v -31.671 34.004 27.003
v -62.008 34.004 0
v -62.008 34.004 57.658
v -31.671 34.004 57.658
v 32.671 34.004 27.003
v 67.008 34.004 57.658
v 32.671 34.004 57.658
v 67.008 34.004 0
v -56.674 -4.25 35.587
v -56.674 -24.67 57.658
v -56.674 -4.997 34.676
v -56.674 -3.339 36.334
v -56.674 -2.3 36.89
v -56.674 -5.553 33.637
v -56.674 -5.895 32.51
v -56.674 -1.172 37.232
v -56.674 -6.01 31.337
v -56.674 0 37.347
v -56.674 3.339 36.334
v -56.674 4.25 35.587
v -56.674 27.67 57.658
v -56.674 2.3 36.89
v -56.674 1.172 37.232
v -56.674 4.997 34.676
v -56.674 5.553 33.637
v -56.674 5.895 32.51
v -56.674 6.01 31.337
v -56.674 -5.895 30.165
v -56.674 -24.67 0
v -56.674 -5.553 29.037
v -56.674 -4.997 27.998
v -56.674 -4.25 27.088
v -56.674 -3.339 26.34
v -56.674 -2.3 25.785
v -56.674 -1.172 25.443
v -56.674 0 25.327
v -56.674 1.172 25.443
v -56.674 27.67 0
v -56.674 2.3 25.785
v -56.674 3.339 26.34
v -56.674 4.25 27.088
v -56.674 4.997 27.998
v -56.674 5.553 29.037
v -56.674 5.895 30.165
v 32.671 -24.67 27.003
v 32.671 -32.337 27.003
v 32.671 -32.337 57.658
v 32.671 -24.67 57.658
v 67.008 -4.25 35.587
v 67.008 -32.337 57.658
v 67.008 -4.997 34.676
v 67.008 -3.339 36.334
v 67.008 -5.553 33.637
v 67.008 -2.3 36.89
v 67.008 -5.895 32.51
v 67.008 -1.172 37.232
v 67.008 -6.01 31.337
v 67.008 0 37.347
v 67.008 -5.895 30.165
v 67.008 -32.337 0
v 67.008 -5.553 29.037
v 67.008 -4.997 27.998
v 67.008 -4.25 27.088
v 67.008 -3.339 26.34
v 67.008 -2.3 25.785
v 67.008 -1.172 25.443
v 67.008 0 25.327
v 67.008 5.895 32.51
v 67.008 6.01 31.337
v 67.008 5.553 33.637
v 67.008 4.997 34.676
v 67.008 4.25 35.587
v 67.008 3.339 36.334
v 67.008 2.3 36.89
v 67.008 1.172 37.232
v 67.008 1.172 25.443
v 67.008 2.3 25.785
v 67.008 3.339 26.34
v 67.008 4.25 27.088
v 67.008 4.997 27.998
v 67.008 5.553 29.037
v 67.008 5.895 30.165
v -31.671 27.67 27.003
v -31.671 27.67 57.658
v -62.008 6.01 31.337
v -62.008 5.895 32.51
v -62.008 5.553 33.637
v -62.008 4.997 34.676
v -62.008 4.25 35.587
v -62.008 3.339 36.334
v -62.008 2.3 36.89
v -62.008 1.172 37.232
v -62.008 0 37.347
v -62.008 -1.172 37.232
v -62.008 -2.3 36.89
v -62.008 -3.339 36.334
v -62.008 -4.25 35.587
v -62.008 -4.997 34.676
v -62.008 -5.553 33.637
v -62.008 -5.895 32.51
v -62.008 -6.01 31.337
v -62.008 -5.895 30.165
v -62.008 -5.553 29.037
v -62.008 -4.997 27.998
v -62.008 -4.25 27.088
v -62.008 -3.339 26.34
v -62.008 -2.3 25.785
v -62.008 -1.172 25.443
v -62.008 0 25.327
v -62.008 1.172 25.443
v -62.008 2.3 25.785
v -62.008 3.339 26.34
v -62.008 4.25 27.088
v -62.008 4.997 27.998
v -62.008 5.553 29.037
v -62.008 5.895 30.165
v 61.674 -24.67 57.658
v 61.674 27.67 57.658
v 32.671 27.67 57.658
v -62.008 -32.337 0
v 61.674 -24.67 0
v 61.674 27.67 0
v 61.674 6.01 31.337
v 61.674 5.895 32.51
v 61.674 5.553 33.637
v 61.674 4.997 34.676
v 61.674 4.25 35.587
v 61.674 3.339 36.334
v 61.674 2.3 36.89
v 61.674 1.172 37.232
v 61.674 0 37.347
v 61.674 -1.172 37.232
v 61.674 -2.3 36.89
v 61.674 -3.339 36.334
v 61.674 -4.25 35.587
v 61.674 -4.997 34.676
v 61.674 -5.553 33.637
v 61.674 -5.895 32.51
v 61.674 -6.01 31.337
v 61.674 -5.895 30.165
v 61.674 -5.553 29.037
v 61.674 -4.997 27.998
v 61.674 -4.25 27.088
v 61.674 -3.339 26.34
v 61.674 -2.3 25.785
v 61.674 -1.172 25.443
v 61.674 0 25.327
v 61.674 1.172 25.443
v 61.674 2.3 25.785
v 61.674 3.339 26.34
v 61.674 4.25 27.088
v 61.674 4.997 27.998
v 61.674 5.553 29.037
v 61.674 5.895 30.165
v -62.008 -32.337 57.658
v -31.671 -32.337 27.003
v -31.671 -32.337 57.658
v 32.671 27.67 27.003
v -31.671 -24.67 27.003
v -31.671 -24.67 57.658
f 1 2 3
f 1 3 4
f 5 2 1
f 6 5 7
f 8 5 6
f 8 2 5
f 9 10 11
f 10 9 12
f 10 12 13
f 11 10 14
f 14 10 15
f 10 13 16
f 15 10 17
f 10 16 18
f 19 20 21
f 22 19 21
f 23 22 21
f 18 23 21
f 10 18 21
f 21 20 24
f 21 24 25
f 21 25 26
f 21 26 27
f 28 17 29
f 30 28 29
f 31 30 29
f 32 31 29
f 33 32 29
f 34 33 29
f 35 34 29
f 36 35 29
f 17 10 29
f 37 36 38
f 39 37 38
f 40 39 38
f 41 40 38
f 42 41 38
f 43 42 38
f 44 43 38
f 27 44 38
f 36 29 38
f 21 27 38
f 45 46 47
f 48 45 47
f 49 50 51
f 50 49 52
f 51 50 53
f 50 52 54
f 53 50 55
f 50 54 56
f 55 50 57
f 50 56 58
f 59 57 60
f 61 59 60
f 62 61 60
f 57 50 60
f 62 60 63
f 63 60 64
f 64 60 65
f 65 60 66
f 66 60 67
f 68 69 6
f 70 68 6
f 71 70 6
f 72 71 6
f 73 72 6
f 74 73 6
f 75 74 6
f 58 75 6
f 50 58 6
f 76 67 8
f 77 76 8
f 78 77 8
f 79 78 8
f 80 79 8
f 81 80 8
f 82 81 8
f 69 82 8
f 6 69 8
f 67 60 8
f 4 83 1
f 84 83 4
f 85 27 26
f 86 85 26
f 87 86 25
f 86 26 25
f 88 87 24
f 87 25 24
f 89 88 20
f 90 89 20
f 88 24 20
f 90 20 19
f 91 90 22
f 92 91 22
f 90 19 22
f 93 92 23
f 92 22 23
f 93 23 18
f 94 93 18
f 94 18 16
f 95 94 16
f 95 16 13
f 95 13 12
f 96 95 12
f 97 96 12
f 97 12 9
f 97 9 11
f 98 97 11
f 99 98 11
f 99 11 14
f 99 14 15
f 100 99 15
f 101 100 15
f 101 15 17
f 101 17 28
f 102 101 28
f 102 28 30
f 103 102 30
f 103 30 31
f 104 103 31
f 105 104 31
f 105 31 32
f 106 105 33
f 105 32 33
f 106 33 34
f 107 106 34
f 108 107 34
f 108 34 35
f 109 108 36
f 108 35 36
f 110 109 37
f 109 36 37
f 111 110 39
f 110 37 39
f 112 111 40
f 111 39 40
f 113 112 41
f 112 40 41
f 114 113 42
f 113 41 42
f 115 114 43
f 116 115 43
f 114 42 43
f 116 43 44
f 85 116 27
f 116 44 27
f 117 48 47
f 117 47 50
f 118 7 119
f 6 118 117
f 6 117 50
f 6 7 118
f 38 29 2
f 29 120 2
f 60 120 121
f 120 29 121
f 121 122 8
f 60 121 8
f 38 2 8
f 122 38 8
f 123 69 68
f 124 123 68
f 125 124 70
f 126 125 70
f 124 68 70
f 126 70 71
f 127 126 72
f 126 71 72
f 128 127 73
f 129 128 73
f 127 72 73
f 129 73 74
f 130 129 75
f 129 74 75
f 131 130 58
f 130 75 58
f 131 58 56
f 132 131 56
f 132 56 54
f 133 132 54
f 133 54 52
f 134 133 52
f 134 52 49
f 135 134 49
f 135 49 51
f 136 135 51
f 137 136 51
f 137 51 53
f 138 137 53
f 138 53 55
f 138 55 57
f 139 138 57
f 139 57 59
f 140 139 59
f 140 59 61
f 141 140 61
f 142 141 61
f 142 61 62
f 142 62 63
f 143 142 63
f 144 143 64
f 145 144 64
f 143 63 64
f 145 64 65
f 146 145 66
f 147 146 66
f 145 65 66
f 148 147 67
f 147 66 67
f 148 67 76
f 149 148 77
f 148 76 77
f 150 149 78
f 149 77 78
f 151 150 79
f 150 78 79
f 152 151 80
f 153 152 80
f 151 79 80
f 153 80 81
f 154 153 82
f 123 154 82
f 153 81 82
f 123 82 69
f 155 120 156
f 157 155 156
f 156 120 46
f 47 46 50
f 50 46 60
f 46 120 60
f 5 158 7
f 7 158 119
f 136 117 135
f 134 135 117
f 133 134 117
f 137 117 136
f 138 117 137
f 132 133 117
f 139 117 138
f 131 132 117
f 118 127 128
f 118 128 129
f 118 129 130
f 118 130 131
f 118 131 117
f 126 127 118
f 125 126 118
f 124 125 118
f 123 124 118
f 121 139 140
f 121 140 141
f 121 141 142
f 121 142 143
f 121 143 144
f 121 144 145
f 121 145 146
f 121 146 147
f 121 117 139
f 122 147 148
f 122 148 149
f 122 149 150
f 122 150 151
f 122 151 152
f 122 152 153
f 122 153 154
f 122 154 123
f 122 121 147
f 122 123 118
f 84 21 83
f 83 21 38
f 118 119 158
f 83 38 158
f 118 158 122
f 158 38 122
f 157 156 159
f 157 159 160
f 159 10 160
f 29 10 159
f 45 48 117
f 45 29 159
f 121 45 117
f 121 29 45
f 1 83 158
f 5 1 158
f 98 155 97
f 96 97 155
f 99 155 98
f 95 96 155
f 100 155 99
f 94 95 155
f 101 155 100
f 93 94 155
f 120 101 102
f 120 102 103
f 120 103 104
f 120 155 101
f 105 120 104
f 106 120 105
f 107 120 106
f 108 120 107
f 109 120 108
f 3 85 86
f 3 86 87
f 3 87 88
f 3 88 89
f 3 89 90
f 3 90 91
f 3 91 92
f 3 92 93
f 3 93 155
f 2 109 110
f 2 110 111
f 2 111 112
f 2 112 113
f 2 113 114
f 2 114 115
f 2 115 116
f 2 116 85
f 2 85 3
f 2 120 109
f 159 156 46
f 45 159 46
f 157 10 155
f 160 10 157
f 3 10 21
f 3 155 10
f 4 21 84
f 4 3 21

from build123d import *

# Parameters (mm, degrees)
F0_W     = 129.016124
F0_H     = 66.341627
F0_W_2   = 118.348129
F0_H_2   = 52.339877
F1_DEPTH = 57.658
F3_W     = 64.341373
F3_H     = 31.337252
F4_DEPTH = 139.446
F6_R     = 6.010004
F7_DEPTH = 240.792


with BuildPart() as f1:
    # F0 (on Top) → F1 (new body)
    with BuildSketch(Plane.XY):
        with Locations((2.500314, 0.833438)):
            Rectangle(F0_W, F0_H)
        with Locations((2.500314, 1.500186)):
            Rectangle(F0_W_2, F0_H_2, mode=Mode.SUBTRACT)
    extrude(amount=F1_DEPTH)

    # F3 (on offset) → F4 (cut)
    with BuildSketch(Plane.XZ.offset(68.834)):
        with Locations((0.500061, 42.672002)):
            Rectangle(F3_W, F3_H)
    extrude(amount=-F4_DEPTH, mode=Mode.SUBTRACT)

    # F6 (on offset) → F7 (cut)
    with BuildSketch(Plane.YZ.offset(71.628)):
        with Locations((0, 31.33725)):
            Circle(F6_R)
    extrude(amount=-F7_DEPTH, mode=Mode.SUBTRACT)


solid = f1.part
